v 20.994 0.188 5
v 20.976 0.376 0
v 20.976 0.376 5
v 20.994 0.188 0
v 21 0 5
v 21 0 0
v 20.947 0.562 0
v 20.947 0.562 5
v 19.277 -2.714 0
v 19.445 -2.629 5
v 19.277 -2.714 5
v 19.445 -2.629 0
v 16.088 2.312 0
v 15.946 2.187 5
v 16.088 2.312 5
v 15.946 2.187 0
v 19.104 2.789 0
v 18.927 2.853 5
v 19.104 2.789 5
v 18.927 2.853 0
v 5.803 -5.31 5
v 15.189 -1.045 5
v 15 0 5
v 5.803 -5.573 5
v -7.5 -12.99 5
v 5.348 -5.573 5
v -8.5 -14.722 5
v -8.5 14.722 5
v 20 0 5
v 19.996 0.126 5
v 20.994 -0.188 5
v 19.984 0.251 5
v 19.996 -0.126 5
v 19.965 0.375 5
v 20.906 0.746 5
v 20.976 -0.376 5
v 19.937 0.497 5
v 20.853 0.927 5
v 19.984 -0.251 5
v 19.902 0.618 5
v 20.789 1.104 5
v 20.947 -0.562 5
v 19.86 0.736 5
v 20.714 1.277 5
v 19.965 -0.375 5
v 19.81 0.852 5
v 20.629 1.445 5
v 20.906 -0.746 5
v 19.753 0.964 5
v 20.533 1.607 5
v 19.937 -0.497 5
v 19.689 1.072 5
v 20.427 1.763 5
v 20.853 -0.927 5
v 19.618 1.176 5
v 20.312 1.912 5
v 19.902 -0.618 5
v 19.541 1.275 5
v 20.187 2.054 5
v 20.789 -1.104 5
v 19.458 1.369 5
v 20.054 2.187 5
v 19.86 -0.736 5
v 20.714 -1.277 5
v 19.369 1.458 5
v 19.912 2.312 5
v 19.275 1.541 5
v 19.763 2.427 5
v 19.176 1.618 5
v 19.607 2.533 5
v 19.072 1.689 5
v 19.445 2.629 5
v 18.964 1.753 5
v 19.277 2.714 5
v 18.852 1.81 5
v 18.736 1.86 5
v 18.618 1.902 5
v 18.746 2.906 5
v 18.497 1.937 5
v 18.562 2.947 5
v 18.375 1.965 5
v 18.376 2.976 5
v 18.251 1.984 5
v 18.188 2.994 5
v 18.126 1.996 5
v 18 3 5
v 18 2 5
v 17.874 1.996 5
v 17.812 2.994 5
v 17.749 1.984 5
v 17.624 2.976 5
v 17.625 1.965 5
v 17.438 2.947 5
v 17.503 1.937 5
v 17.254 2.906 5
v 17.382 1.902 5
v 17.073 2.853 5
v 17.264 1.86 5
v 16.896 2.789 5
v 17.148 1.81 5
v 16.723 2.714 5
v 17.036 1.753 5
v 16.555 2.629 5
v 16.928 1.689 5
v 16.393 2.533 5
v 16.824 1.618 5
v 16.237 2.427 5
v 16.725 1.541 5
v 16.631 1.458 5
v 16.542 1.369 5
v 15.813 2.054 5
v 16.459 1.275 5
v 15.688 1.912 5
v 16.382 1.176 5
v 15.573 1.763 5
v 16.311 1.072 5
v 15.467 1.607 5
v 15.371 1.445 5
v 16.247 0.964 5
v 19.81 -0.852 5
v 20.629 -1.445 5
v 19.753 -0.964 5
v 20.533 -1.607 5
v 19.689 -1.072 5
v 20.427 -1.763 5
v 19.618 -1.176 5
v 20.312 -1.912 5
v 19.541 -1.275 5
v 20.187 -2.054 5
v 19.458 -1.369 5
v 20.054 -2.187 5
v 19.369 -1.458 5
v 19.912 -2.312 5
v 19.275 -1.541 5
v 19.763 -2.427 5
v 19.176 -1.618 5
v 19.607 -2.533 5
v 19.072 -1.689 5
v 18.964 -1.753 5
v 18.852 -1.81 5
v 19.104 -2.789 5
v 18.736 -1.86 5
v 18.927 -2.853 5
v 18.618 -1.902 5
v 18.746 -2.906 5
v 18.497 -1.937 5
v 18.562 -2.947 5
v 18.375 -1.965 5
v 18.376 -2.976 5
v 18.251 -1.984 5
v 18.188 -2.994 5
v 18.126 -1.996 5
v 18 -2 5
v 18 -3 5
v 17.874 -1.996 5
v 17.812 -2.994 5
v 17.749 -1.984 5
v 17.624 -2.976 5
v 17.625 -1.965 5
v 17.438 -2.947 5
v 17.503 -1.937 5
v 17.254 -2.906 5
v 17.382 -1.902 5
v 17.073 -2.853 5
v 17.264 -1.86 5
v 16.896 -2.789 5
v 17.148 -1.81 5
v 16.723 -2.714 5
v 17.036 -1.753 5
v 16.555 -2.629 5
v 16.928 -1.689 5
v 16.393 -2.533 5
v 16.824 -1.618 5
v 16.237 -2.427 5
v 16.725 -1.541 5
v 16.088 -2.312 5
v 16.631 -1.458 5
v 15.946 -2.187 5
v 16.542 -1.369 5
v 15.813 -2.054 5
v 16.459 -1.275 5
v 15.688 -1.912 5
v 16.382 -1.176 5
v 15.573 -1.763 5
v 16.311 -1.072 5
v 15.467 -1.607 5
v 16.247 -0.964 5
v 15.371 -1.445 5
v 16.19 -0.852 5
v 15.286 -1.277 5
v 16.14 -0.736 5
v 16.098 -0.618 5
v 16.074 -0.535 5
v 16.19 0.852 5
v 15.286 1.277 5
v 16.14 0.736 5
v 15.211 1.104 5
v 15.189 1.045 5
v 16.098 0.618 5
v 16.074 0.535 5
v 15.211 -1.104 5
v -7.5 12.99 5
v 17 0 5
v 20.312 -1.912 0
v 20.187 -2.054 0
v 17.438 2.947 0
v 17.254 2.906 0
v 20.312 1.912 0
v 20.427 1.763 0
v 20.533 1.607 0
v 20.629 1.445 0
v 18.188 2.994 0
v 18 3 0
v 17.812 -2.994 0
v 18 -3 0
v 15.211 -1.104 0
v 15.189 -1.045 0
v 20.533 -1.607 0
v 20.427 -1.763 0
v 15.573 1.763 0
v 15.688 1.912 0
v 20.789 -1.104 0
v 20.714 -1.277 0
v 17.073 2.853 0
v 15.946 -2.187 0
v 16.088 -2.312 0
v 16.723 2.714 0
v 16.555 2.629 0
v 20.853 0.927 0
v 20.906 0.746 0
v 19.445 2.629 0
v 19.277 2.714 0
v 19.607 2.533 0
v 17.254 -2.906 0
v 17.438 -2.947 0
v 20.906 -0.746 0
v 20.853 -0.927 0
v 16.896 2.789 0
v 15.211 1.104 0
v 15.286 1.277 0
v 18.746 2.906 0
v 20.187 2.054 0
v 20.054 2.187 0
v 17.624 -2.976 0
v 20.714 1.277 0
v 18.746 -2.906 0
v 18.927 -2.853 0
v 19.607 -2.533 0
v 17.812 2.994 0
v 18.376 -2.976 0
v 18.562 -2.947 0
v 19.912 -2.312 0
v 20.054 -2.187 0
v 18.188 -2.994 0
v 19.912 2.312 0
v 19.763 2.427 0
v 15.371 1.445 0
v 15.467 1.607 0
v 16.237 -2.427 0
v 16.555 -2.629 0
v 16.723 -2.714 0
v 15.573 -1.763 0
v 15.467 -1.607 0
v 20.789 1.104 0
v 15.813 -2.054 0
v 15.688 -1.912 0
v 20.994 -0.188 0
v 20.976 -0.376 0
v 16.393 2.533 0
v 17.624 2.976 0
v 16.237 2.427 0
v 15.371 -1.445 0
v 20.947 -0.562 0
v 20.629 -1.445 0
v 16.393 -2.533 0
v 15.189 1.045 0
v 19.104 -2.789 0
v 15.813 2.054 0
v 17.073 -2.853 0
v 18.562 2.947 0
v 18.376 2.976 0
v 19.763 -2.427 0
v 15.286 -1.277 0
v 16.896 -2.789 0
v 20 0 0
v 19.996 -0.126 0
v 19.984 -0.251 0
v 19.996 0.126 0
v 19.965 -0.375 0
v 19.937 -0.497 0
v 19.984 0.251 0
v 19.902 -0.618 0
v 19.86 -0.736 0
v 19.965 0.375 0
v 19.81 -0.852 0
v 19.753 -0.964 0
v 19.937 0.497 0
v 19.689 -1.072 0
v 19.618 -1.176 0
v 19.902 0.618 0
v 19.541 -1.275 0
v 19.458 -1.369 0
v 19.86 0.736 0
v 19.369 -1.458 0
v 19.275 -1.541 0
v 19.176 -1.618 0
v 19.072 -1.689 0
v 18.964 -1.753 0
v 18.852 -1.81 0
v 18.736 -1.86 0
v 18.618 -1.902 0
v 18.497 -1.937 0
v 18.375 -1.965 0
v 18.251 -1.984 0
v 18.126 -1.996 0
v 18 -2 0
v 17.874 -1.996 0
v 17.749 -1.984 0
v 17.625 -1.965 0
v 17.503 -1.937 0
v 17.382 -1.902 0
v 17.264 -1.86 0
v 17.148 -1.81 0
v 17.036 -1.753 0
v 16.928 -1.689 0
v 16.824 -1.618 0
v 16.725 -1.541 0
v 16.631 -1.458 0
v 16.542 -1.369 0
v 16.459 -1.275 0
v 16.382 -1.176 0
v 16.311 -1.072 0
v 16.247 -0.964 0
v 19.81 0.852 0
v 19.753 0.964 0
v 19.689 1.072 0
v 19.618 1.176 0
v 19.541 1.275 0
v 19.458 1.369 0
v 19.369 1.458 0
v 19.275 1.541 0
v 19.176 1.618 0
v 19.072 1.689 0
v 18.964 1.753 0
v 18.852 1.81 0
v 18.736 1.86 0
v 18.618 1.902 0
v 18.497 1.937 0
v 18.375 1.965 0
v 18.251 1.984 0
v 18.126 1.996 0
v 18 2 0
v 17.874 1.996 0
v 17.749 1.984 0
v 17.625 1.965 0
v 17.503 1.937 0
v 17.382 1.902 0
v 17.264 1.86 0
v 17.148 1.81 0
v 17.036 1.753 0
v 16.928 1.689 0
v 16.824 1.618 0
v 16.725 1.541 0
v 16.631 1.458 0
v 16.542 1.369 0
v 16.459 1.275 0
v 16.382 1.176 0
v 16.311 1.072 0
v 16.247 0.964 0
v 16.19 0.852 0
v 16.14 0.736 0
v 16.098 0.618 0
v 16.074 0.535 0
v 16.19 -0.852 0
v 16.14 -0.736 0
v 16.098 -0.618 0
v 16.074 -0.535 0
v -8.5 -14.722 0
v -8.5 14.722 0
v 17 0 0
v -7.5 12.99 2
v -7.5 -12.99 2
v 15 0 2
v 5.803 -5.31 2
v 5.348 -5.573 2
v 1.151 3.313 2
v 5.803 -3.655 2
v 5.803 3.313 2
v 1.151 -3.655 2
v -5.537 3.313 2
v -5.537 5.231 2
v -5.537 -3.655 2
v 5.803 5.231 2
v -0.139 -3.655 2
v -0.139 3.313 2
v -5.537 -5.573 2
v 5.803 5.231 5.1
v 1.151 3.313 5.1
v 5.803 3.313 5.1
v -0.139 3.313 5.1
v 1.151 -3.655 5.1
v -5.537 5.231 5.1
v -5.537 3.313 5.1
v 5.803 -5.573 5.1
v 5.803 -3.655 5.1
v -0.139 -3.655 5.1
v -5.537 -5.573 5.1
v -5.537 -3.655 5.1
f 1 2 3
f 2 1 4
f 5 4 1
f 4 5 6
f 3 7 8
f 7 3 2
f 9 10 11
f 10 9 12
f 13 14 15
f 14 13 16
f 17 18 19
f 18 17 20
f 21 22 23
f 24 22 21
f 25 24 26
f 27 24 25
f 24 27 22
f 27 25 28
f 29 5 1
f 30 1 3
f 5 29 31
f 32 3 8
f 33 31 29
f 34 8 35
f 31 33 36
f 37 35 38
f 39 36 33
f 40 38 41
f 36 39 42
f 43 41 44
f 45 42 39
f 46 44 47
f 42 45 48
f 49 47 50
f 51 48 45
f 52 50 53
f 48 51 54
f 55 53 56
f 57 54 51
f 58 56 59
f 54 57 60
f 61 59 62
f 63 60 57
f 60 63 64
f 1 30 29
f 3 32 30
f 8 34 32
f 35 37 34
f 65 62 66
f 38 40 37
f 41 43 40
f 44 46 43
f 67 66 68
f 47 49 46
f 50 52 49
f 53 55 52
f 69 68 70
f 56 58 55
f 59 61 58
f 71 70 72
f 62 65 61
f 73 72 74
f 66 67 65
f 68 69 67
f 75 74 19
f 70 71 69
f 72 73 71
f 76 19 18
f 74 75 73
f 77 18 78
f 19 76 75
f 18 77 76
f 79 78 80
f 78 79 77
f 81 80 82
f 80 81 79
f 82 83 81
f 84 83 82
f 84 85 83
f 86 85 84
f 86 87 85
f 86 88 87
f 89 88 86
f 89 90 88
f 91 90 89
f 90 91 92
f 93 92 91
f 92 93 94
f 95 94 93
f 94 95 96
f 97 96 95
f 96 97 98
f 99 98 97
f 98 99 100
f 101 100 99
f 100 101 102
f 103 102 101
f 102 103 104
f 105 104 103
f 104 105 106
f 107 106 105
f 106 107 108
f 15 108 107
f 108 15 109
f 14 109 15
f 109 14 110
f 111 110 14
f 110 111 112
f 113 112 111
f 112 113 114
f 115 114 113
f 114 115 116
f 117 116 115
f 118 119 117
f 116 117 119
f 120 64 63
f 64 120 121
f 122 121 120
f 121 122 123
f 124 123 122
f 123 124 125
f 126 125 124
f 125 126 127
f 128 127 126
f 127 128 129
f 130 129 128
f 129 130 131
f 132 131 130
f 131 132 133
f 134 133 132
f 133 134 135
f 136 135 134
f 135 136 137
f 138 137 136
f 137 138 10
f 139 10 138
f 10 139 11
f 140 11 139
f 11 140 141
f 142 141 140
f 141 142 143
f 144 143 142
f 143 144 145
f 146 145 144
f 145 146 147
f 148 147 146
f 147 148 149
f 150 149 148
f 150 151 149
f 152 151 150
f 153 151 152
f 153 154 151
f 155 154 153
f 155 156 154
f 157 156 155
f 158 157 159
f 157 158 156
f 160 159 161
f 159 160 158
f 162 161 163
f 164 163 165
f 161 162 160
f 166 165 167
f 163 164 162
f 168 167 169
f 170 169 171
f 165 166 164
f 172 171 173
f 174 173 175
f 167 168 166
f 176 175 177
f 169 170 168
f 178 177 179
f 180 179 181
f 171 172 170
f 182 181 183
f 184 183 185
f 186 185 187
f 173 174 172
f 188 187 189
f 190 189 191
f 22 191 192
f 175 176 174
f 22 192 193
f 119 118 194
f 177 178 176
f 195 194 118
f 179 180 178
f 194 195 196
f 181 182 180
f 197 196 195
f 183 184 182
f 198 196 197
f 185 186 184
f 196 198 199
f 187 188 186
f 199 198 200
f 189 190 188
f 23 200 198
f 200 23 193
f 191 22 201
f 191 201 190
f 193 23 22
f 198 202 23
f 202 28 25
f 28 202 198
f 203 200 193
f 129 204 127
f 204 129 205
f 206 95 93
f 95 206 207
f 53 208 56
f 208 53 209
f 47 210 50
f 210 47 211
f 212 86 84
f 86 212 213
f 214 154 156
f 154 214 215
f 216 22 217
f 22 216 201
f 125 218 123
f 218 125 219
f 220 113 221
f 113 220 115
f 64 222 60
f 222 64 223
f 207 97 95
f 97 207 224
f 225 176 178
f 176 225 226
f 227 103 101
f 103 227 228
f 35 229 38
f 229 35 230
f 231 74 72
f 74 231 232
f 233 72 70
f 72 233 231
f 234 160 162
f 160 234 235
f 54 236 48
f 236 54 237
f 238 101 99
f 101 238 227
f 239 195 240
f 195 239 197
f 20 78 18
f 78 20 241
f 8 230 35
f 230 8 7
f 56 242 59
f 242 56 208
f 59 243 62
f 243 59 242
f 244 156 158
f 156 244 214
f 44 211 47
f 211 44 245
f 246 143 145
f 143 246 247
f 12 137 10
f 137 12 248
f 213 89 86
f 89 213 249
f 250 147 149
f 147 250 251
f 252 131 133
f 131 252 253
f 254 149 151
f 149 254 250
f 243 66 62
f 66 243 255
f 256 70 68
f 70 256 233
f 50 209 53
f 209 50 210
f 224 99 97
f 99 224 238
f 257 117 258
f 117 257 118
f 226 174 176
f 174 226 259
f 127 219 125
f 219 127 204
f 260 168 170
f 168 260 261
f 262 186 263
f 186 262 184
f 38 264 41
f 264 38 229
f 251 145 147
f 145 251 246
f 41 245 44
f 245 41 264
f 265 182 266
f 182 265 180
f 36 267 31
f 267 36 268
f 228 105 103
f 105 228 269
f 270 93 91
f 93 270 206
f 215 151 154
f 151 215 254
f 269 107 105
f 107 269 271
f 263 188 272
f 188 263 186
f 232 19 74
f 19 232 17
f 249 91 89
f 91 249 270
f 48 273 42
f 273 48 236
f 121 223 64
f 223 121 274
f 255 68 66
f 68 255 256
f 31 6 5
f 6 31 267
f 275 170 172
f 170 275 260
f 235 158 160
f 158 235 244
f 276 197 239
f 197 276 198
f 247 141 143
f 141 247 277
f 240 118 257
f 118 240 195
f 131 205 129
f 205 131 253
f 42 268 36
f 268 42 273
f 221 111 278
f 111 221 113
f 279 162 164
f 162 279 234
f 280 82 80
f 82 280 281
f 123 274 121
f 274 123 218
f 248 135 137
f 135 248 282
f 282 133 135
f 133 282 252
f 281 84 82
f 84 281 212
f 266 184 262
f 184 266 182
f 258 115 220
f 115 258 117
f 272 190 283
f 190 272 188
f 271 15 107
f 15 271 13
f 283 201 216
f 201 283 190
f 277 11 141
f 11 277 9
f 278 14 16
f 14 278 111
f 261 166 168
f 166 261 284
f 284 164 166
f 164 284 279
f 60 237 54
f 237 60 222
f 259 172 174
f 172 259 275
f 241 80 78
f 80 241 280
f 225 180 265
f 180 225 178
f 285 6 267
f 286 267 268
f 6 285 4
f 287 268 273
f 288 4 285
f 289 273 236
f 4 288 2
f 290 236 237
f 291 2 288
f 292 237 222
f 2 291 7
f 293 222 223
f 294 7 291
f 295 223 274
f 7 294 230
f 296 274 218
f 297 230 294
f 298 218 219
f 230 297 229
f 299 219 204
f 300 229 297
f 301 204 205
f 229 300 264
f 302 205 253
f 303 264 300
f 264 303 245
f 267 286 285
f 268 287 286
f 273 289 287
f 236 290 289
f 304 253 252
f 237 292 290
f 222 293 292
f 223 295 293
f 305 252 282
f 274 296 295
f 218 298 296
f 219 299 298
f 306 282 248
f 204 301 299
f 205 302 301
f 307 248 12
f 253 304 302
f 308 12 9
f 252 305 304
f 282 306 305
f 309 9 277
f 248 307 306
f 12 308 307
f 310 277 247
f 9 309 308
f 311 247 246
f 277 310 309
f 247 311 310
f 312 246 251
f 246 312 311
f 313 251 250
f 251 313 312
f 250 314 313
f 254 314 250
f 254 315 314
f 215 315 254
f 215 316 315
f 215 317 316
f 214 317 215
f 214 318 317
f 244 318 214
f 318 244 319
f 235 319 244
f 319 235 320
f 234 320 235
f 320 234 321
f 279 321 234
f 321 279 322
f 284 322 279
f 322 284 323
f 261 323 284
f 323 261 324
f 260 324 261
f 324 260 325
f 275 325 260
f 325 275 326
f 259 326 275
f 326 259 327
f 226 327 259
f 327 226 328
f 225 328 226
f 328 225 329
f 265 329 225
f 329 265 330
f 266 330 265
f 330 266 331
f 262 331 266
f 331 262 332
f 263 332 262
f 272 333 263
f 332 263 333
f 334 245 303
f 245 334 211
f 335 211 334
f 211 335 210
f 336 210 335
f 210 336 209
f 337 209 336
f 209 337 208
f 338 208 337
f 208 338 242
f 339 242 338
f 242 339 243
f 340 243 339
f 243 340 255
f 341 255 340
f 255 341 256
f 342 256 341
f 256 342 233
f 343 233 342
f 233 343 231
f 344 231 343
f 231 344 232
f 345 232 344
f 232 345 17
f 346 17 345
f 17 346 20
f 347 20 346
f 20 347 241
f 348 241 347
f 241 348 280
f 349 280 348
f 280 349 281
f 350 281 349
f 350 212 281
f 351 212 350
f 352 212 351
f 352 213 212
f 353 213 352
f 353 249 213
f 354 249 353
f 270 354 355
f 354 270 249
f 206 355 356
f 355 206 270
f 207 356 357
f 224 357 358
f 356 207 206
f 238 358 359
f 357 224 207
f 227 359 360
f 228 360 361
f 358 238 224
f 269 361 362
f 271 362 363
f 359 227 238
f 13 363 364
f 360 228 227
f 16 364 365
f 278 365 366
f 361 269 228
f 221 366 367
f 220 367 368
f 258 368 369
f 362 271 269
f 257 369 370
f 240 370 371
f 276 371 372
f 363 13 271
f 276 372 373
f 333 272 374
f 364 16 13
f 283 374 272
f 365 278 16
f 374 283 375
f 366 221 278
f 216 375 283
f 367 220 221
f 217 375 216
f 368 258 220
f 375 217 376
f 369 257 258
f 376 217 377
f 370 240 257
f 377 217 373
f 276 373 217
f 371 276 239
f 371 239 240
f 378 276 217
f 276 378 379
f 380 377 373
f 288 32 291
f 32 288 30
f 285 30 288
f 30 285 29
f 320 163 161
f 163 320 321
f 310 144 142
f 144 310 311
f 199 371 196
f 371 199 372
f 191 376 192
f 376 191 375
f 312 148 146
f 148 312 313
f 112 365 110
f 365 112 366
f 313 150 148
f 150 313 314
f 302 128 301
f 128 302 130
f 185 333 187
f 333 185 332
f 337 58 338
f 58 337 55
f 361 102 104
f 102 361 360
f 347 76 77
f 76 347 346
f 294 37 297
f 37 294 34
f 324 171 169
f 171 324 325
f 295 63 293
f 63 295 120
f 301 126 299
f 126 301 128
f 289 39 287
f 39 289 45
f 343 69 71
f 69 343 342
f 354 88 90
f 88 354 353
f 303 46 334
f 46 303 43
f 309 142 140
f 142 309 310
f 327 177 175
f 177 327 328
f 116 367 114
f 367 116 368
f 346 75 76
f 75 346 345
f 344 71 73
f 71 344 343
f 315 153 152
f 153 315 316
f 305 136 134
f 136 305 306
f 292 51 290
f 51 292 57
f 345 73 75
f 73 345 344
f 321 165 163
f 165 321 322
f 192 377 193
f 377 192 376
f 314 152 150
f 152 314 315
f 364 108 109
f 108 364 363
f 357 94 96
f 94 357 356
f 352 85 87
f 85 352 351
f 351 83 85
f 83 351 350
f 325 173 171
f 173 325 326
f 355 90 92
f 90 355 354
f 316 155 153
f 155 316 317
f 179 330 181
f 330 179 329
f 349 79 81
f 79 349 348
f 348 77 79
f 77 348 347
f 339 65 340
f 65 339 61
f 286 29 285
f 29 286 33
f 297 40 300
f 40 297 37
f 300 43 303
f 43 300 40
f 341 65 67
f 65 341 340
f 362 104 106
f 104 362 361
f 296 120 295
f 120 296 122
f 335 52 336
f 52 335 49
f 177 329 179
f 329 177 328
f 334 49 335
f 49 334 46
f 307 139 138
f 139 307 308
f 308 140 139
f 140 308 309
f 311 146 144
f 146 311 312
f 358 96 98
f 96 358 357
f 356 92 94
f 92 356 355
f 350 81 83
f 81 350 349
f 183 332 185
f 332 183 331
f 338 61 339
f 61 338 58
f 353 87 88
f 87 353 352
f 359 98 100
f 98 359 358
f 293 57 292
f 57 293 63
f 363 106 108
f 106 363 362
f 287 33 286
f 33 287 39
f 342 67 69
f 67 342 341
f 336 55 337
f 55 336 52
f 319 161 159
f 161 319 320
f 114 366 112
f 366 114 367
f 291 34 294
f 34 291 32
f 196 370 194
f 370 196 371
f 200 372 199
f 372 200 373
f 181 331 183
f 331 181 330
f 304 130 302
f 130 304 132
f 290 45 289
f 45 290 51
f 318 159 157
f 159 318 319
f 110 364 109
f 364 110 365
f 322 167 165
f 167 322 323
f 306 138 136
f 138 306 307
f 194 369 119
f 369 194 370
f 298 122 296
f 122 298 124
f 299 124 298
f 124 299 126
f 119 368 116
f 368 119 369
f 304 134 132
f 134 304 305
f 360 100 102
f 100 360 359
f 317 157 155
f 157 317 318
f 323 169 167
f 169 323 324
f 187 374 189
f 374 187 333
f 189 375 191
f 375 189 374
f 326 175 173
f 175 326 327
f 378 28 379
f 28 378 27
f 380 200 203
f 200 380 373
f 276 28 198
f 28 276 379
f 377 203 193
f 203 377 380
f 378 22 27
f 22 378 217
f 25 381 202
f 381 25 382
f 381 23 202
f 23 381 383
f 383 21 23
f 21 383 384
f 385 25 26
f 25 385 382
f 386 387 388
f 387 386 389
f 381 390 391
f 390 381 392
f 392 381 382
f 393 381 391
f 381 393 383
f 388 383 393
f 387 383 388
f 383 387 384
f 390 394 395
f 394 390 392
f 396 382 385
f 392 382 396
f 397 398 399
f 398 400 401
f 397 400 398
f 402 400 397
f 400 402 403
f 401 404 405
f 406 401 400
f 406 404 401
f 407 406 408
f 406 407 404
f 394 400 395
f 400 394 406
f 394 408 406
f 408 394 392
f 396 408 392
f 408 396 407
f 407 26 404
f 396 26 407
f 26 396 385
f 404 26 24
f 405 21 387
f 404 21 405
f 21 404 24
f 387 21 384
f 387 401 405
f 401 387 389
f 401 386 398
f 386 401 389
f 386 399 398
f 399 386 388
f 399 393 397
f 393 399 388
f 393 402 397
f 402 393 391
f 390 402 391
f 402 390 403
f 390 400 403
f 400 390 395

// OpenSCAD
union() {
        translate(v=[18,0,0]) {
        difference() {
        
        color("grey")
        cylinder(r=3,h=5,$fn=100);
        translate(v=[0,0,-1]) {
        cylinder(r=2,h=7,$fn=100);
        }
        }
    }
    
    difference() {
        color("grey")
        cylinder(r=17,h=5,$fn=3);
        color("grey")
        translate(v=[0,0,2]) {
            cylinder(r=15,h=5,$fn=3);
        }
    }

    scale([2.8,3.5,1.7]) {  
        linear_extrude(height=3) { 
           rotate([0, 0, 270]) {
          text("H",4, font="Algerian",halign = "center", valign = "center");  
           }
        } 
    } 
} 
